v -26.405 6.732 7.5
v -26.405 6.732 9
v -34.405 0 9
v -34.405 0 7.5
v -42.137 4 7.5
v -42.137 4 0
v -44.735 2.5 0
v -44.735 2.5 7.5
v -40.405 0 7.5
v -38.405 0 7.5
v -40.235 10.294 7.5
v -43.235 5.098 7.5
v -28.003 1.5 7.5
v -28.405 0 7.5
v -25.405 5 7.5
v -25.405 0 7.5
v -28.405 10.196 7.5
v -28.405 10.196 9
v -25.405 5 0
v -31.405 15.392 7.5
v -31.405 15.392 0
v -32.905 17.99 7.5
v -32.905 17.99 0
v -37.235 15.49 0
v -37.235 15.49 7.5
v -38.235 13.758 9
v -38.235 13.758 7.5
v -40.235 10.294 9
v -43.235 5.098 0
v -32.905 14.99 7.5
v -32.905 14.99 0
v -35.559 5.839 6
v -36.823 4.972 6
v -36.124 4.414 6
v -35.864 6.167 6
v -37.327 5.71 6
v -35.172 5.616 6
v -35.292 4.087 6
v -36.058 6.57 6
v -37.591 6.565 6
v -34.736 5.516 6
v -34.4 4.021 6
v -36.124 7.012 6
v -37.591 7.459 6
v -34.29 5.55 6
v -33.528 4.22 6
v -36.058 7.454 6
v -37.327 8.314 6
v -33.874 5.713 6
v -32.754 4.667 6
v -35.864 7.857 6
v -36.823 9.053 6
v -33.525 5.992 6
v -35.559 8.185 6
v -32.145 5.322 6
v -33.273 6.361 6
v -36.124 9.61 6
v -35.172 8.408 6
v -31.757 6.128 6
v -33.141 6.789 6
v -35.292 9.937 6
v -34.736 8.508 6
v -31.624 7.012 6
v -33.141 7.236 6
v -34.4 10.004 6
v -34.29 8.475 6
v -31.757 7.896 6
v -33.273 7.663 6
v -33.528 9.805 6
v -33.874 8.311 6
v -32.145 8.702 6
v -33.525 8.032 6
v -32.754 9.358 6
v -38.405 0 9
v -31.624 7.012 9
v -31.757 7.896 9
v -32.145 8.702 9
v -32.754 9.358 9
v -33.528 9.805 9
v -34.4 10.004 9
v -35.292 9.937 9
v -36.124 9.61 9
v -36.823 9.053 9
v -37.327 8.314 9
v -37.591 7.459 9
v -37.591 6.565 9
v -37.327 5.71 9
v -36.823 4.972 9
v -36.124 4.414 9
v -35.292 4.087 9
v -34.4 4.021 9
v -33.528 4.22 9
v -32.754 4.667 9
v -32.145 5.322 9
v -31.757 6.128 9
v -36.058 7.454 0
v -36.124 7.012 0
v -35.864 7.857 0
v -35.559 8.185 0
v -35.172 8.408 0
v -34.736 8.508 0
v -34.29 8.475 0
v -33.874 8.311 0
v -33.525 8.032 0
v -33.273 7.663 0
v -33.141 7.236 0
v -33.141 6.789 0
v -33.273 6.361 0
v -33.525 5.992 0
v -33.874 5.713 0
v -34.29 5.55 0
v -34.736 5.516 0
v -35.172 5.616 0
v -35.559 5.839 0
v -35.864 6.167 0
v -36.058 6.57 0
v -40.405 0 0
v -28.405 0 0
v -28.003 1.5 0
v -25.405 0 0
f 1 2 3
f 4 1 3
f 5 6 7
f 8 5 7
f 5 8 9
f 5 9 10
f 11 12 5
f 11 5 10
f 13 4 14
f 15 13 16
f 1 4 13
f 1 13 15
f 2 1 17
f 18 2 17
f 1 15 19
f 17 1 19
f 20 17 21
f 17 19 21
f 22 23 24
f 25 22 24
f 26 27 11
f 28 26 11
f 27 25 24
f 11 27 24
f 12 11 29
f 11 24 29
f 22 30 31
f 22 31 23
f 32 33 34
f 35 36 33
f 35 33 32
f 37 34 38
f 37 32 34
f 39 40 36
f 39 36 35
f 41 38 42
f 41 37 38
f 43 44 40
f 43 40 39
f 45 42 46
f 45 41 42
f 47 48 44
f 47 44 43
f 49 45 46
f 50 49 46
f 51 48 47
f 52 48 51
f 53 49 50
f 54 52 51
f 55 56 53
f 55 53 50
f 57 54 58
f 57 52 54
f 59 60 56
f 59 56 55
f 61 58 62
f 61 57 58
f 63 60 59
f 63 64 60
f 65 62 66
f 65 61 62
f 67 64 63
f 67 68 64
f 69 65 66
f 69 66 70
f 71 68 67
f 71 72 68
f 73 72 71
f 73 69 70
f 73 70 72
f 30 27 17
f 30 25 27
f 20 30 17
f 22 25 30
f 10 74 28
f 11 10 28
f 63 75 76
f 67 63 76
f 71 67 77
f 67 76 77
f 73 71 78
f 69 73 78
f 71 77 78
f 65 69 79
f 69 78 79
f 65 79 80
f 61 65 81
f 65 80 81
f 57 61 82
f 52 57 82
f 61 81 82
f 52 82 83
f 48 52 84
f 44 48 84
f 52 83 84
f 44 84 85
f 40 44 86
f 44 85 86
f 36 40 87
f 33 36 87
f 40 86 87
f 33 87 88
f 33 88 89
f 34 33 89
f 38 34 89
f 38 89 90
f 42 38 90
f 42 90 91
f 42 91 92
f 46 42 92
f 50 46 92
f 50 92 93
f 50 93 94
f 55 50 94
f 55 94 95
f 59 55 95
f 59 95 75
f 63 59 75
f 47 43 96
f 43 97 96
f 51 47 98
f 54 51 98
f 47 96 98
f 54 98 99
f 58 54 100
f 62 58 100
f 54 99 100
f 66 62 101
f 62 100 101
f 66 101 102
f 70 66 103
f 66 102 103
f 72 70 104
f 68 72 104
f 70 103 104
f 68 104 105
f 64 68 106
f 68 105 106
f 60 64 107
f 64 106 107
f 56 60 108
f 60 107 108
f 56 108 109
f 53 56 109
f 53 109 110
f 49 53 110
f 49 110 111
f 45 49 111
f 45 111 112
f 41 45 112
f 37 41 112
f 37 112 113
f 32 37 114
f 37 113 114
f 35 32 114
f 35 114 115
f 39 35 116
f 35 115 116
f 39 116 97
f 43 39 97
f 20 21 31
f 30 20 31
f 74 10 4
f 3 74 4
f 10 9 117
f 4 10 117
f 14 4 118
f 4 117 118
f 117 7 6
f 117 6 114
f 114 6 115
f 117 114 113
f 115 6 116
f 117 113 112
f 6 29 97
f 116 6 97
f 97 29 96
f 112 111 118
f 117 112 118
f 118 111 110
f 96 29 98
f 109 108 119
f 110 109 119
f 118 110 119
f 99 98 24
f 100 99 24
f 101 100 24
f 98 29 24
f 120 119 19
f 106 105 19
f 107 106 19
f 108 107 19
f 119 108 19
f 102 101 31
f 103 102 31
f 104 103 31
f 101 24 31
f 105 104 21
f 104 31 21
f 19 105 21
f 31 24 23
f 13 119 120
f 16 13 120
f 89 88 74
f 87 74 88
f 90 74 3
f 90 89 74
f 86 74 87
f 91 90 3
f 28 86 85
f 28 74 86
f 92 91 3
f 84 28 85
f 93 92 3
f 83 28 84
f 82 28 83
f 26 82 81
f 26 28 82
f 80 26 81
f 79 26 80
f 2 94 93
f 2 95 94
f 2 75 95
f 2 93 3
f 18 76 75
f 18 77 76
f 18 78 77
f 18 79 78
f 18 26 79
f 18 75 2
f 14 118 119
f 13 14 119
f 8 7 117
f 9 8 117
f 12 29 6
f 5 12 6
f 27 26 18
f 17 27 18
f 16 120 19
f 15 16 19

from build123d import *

# Parameters (mm, degrees)
EXTRUDE_1_DEPTH           = 9
CUT_EXTRUDE_5_DEPTH       = 1.5
HOLE_WIZARD_1_D           = 3
HOLE_WIZARD_1_CBORE_D     = 6
HOLE_WIZARD_1_CBORE_DEPTH = 3


with BuildPart() as part:
    # 草图1 → 凸台-拉伸1 (new body)
    with BuildSketch(Plane.XY):
        Polygon((-37.234772054, 15.490381057), (-43.234772054, 5.098076211), (-42.136695843, 4), (-44.734772054, 2.5), (-40.404645035, 0), (-28.404645035, 0), (-28.002721246, 1.5), (-25.404645035, 0), (-25.404645035, 5), (-31.404645035, 15.392304845), (-32.904645035, 14.990381057), (-32.904645035, 17.990381057), align=None)
    extrude(amount=EXTRUDE_1_DEPTH)

    # 草图2 → 切除-拉伸5 (cut)
    with BuildSketch(Plane.XY.offset(9)):
        Polygon((-38.404645035, 0), (-40.234772054, 10.294228634), (-43.234772054, 5.098076211), (-42.136695843, 4), (-44.734772054, 2.5), (-40.404645035, 0), align=None)
        Polygon((-38.234772054, 13.758330249), (-28.404645035, 10.196152423), (-31.404645035, 15.392304845), (-32.904645035, 14.990381057), (-32.904645035, 17.990381057), (-37.234772054, 15.490381057), align=None)
        Polygon((-26.404645035, 6.732050808), (-34.404645035, 0), (-28.404645035, 0), (-28.002721246, 1.5), (-25.404645035, 0), (-25.404645035, 5), align=None)
    extrude(amount=-CUT_EXTRUDE_5_DEPTH, mode=Mode.SUBTRACT)

    # 孔1 (through all)
    with Locations(Plane.XY.offset(9)):
        with Locations((-34.624141854, 7.012125204)):
            CounterBoreHole(HOLE_WIZARD_1_D / 2, HOLE_WIZARD_1_CBORE_D / 2, HOLE_WIZARD_1_CBORE_DEPTH)


solid = part.part
